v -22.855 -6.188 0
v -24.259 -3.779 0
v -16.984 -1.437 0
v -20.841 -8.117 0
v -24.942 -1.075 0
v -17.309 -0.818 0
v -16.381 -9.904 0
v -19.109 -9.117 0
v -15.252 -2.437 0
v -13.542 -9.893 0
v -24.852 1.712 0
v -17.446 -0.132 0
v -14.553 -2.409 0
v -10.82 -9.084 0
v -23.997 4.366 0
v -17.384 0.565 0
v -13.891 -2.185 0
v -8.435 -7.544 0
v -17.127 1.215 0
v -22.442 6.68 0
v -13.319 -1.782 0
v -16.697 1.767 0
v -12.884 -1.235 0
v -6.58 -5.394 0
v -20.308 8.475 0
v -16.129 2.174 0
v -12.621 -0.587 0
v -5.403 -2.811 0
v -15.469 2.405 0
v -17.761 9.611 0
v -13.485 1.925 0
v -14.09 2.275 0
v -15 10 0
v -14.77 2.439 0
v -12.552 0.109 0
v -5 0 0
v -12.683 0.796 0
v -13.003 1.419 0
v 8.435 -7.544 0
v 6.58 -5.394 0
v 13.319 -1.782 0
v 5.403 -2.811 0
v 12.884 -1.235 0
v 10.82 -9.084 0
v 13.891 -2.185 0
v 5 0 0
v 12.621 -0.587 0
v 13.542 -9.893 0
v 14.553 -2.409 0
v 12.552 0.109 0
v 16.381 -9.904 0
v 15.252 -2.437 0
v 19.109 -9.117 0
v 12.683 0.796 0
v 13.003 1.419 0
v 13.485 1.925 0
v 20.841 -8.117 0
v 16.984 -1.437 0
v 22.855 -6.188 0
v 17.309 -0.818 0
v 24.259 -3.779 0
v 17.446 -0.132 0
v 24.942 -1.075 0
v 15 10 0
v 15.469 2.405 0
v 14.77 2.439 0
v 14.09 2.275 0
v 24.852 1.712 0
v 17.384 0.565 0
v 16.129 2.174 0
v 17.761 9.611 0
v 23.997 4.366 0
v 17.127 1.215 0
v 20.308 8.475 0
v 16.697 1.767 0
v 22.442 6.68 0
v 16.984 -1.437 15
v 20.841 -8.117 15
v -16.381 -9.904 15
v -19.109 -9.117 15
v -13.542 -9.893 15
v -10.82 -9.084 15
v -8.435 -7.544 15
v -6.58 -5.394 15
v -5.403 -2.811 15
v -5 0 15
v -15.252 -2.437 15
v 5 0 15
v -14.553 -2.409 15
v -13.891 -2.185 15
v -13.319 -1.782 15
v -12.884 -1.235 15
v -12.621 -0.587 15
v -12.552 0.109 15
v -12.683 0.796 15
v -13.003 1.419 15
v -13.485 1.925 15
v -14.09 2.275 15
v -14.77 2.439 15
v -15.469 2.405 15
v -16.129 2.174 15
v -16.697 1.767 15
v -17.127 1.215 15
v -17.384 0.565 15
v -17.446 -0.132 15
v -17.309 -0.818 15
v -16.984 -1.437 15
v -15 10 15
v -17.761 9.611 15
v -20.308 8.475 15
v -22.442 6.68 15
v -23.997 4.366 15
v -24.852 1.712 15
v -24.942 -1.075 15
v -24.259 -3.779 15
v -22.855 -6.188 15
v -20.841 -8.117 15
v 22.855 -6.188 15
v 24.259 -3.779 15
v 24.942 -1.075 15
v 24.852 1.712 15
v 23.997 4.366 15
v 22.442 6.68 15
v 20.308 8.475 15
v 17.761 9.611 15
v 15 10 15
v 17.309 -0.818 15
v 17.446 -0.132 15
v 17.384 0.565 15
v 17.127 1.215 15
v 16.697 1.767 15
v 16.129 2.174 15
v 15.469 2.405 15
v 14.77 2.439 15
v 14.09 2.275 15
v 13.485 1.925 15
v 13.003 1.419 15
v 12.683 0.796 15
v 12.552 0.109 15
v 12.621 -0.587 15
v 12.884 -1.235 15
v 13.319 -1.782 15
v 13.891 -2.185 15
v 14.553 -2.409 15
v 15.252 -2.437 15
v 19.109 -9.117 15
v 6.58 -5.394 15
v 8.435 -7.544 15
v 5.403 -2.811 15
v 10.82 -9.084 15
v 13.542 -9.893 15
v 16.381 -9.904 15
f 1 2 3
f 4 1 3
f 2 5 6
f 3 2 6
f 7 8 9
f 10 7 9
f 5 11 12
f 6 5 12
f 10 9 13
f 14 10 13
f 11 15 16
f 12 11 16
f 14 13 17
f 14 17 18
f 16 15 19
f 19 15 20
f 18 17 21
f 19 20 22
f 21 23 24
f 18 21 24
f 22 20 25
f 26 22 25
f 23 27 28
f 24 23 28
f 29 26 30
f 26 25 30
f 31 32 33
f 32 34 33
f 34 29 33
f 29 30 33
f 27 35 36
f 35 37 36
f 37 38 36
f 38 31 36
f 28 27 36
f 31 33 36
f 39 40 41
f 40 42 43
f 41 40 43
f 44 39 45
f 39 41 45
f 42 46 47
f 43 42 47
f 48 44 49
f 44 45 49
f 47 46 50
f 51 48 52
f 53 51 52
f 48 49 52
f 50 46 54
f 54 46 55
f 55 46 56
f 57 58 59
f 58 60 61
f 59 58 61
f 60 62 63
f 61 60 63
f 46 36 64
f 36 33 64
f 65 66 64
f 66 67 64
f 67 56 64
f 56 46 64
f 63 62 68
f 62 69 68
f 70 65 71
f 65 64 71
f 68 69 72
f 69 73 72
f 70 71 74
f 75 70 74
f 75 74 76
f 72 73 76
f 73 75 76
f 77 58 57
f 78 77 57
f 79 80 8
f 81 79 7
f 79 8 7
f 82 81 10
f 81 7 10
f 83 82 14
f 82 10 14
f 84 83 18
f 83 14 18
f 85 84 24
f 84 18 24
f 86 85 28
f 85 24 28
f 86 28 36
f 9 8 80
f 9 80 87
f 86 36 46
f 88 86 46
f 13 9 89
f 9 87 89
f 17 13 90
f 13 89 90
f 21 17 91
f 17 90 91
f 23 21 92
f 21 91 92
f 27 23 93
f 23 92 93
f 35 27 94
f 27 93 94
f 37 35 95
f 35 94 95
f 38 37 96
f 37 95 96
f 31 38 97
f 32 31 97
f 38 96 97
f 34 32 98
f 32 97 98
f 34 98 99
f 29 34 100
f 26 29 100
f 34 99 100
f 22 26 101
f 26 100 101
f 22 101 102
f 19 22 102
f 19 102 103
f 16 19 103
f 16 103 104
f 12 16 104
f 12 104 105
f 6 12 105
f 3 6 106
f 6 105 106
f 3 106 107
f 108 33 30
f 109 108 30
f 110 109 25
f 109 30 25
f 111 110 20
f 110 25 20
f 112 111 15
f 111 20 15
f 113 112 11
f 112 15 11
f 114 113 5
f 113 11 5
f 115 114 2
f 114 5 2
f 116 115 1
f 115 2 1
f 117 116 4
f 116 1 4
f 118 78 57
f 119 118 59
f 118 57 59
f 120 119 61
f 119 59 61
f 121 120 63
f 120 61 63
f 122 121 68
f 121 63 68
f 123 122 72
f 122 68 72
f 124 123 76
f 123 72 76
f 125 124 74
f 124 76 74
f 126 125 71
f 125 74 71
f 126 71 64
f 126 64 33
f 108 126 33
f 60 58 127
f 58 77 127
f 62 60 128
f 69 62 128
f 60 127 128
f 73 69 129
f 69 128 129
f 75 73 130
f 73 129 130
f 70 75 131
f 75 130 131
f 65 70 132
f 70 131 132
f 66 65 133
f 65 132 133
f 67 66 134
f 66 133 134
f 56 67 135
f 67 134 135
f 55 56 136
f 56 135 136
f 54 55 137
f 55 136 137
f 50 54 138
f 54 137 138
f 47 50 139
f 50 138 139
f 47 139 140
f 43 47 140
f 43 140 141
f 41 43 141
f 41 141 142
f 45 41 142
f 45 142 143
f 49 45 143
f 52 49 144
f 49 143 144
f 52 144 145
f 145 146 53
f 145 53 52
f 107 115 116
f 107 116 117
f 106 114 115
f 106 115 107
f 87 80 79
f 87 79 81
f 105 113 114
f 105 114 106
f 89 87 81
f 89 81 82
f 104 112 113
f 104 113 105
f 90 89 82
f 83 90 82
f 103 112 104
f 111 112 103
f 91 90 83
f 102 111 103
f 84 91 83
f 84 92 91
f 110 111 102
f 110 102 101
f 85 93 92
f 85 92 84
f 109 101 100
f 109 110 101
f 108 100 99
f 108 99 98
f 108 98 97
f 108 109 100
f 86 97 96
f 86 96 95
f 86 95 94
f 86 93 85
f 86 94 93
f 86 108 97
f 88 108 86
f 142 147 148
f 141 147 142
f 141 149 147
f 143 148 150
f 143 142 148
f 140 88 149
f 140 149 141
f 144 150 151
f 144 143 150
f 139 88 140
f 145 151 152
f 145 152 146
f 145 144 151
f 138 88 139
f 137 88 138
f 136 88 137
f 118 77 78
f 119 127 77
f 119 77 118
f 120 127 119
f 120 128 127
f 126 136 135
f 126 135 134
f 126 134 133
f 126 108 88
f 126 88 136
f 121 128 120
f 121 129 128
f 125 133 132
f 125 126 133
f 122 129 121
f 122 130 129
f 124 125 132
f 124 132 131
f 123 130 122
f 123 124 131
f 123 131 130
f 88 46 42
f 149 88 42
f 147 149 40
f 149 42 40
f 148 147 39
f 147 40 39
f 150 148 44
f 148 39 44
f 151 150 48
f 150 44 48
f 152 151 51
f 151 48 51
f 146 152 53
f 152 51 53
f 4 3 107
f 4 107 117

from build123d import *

# Parameters (mm, degrees)
BOSS_EXTRUDE1_DEPTH = 15
SKETCH3_R           = 2.45
CUT_EXTRUDE1_DEPTH  = 31.822070015
CUT_EXTRUDE2_DEPTH  = 31.822070015


with BuildPart() as part:
    # Sketch2 → Boss-Extrude1 (new body)
    with BuildSketch(Plane.XY):
        with BuildLine():
            Line((-5, 10), (-15, 10))
            ThreePointArc((-15, 10), (-22.071067812, -7.071067812), (-5, 0))
            Line((-5, 0), (5, 0))
            ThreePointArc((5, 0), (22.071067812, -7.071067812), (15, 10))
            Line((15, 10), (5, 10))
            Line((5, 10), (-5, 10))
        make_face()
    extrude(amount=BOSS_EXTRUDE1_DEPTH)

    # Sketch3 → Cut-Extrude1 (cut, through all)
    with BuildSketch(Plane.XY.offset(15)):
        with Locations((-15, 0)):
            Circle(SKETCH3_R)
        with Locations((15, 0)):
            Circle(SKETCH3_R)
    extrude(amount=-CUT_EXTRUDE1_DEPTH, mode=Mode.SUBTRACT)

    # Sketch4 → Cut-Extrude2 (cut, through all)
    with BuildSketch(Plane.XY.offset(15)):
        Polygon((-14.133974596, -0.5), (-15.866025404, 0.5), (-20.866025404, -8.160254038), (-19.133974596, -9.160254038), align=None)
        Polygon((14.133974596, -0.5), (15.866025404, 0.5), (20.866025404, -8.160254038), (19.133974596, -9.160254038), align=None)
    extrude(amount=-CUT_EXTRUDE2_DEPTH, mode=Mode.SUBTRACT)


solid = part.part
